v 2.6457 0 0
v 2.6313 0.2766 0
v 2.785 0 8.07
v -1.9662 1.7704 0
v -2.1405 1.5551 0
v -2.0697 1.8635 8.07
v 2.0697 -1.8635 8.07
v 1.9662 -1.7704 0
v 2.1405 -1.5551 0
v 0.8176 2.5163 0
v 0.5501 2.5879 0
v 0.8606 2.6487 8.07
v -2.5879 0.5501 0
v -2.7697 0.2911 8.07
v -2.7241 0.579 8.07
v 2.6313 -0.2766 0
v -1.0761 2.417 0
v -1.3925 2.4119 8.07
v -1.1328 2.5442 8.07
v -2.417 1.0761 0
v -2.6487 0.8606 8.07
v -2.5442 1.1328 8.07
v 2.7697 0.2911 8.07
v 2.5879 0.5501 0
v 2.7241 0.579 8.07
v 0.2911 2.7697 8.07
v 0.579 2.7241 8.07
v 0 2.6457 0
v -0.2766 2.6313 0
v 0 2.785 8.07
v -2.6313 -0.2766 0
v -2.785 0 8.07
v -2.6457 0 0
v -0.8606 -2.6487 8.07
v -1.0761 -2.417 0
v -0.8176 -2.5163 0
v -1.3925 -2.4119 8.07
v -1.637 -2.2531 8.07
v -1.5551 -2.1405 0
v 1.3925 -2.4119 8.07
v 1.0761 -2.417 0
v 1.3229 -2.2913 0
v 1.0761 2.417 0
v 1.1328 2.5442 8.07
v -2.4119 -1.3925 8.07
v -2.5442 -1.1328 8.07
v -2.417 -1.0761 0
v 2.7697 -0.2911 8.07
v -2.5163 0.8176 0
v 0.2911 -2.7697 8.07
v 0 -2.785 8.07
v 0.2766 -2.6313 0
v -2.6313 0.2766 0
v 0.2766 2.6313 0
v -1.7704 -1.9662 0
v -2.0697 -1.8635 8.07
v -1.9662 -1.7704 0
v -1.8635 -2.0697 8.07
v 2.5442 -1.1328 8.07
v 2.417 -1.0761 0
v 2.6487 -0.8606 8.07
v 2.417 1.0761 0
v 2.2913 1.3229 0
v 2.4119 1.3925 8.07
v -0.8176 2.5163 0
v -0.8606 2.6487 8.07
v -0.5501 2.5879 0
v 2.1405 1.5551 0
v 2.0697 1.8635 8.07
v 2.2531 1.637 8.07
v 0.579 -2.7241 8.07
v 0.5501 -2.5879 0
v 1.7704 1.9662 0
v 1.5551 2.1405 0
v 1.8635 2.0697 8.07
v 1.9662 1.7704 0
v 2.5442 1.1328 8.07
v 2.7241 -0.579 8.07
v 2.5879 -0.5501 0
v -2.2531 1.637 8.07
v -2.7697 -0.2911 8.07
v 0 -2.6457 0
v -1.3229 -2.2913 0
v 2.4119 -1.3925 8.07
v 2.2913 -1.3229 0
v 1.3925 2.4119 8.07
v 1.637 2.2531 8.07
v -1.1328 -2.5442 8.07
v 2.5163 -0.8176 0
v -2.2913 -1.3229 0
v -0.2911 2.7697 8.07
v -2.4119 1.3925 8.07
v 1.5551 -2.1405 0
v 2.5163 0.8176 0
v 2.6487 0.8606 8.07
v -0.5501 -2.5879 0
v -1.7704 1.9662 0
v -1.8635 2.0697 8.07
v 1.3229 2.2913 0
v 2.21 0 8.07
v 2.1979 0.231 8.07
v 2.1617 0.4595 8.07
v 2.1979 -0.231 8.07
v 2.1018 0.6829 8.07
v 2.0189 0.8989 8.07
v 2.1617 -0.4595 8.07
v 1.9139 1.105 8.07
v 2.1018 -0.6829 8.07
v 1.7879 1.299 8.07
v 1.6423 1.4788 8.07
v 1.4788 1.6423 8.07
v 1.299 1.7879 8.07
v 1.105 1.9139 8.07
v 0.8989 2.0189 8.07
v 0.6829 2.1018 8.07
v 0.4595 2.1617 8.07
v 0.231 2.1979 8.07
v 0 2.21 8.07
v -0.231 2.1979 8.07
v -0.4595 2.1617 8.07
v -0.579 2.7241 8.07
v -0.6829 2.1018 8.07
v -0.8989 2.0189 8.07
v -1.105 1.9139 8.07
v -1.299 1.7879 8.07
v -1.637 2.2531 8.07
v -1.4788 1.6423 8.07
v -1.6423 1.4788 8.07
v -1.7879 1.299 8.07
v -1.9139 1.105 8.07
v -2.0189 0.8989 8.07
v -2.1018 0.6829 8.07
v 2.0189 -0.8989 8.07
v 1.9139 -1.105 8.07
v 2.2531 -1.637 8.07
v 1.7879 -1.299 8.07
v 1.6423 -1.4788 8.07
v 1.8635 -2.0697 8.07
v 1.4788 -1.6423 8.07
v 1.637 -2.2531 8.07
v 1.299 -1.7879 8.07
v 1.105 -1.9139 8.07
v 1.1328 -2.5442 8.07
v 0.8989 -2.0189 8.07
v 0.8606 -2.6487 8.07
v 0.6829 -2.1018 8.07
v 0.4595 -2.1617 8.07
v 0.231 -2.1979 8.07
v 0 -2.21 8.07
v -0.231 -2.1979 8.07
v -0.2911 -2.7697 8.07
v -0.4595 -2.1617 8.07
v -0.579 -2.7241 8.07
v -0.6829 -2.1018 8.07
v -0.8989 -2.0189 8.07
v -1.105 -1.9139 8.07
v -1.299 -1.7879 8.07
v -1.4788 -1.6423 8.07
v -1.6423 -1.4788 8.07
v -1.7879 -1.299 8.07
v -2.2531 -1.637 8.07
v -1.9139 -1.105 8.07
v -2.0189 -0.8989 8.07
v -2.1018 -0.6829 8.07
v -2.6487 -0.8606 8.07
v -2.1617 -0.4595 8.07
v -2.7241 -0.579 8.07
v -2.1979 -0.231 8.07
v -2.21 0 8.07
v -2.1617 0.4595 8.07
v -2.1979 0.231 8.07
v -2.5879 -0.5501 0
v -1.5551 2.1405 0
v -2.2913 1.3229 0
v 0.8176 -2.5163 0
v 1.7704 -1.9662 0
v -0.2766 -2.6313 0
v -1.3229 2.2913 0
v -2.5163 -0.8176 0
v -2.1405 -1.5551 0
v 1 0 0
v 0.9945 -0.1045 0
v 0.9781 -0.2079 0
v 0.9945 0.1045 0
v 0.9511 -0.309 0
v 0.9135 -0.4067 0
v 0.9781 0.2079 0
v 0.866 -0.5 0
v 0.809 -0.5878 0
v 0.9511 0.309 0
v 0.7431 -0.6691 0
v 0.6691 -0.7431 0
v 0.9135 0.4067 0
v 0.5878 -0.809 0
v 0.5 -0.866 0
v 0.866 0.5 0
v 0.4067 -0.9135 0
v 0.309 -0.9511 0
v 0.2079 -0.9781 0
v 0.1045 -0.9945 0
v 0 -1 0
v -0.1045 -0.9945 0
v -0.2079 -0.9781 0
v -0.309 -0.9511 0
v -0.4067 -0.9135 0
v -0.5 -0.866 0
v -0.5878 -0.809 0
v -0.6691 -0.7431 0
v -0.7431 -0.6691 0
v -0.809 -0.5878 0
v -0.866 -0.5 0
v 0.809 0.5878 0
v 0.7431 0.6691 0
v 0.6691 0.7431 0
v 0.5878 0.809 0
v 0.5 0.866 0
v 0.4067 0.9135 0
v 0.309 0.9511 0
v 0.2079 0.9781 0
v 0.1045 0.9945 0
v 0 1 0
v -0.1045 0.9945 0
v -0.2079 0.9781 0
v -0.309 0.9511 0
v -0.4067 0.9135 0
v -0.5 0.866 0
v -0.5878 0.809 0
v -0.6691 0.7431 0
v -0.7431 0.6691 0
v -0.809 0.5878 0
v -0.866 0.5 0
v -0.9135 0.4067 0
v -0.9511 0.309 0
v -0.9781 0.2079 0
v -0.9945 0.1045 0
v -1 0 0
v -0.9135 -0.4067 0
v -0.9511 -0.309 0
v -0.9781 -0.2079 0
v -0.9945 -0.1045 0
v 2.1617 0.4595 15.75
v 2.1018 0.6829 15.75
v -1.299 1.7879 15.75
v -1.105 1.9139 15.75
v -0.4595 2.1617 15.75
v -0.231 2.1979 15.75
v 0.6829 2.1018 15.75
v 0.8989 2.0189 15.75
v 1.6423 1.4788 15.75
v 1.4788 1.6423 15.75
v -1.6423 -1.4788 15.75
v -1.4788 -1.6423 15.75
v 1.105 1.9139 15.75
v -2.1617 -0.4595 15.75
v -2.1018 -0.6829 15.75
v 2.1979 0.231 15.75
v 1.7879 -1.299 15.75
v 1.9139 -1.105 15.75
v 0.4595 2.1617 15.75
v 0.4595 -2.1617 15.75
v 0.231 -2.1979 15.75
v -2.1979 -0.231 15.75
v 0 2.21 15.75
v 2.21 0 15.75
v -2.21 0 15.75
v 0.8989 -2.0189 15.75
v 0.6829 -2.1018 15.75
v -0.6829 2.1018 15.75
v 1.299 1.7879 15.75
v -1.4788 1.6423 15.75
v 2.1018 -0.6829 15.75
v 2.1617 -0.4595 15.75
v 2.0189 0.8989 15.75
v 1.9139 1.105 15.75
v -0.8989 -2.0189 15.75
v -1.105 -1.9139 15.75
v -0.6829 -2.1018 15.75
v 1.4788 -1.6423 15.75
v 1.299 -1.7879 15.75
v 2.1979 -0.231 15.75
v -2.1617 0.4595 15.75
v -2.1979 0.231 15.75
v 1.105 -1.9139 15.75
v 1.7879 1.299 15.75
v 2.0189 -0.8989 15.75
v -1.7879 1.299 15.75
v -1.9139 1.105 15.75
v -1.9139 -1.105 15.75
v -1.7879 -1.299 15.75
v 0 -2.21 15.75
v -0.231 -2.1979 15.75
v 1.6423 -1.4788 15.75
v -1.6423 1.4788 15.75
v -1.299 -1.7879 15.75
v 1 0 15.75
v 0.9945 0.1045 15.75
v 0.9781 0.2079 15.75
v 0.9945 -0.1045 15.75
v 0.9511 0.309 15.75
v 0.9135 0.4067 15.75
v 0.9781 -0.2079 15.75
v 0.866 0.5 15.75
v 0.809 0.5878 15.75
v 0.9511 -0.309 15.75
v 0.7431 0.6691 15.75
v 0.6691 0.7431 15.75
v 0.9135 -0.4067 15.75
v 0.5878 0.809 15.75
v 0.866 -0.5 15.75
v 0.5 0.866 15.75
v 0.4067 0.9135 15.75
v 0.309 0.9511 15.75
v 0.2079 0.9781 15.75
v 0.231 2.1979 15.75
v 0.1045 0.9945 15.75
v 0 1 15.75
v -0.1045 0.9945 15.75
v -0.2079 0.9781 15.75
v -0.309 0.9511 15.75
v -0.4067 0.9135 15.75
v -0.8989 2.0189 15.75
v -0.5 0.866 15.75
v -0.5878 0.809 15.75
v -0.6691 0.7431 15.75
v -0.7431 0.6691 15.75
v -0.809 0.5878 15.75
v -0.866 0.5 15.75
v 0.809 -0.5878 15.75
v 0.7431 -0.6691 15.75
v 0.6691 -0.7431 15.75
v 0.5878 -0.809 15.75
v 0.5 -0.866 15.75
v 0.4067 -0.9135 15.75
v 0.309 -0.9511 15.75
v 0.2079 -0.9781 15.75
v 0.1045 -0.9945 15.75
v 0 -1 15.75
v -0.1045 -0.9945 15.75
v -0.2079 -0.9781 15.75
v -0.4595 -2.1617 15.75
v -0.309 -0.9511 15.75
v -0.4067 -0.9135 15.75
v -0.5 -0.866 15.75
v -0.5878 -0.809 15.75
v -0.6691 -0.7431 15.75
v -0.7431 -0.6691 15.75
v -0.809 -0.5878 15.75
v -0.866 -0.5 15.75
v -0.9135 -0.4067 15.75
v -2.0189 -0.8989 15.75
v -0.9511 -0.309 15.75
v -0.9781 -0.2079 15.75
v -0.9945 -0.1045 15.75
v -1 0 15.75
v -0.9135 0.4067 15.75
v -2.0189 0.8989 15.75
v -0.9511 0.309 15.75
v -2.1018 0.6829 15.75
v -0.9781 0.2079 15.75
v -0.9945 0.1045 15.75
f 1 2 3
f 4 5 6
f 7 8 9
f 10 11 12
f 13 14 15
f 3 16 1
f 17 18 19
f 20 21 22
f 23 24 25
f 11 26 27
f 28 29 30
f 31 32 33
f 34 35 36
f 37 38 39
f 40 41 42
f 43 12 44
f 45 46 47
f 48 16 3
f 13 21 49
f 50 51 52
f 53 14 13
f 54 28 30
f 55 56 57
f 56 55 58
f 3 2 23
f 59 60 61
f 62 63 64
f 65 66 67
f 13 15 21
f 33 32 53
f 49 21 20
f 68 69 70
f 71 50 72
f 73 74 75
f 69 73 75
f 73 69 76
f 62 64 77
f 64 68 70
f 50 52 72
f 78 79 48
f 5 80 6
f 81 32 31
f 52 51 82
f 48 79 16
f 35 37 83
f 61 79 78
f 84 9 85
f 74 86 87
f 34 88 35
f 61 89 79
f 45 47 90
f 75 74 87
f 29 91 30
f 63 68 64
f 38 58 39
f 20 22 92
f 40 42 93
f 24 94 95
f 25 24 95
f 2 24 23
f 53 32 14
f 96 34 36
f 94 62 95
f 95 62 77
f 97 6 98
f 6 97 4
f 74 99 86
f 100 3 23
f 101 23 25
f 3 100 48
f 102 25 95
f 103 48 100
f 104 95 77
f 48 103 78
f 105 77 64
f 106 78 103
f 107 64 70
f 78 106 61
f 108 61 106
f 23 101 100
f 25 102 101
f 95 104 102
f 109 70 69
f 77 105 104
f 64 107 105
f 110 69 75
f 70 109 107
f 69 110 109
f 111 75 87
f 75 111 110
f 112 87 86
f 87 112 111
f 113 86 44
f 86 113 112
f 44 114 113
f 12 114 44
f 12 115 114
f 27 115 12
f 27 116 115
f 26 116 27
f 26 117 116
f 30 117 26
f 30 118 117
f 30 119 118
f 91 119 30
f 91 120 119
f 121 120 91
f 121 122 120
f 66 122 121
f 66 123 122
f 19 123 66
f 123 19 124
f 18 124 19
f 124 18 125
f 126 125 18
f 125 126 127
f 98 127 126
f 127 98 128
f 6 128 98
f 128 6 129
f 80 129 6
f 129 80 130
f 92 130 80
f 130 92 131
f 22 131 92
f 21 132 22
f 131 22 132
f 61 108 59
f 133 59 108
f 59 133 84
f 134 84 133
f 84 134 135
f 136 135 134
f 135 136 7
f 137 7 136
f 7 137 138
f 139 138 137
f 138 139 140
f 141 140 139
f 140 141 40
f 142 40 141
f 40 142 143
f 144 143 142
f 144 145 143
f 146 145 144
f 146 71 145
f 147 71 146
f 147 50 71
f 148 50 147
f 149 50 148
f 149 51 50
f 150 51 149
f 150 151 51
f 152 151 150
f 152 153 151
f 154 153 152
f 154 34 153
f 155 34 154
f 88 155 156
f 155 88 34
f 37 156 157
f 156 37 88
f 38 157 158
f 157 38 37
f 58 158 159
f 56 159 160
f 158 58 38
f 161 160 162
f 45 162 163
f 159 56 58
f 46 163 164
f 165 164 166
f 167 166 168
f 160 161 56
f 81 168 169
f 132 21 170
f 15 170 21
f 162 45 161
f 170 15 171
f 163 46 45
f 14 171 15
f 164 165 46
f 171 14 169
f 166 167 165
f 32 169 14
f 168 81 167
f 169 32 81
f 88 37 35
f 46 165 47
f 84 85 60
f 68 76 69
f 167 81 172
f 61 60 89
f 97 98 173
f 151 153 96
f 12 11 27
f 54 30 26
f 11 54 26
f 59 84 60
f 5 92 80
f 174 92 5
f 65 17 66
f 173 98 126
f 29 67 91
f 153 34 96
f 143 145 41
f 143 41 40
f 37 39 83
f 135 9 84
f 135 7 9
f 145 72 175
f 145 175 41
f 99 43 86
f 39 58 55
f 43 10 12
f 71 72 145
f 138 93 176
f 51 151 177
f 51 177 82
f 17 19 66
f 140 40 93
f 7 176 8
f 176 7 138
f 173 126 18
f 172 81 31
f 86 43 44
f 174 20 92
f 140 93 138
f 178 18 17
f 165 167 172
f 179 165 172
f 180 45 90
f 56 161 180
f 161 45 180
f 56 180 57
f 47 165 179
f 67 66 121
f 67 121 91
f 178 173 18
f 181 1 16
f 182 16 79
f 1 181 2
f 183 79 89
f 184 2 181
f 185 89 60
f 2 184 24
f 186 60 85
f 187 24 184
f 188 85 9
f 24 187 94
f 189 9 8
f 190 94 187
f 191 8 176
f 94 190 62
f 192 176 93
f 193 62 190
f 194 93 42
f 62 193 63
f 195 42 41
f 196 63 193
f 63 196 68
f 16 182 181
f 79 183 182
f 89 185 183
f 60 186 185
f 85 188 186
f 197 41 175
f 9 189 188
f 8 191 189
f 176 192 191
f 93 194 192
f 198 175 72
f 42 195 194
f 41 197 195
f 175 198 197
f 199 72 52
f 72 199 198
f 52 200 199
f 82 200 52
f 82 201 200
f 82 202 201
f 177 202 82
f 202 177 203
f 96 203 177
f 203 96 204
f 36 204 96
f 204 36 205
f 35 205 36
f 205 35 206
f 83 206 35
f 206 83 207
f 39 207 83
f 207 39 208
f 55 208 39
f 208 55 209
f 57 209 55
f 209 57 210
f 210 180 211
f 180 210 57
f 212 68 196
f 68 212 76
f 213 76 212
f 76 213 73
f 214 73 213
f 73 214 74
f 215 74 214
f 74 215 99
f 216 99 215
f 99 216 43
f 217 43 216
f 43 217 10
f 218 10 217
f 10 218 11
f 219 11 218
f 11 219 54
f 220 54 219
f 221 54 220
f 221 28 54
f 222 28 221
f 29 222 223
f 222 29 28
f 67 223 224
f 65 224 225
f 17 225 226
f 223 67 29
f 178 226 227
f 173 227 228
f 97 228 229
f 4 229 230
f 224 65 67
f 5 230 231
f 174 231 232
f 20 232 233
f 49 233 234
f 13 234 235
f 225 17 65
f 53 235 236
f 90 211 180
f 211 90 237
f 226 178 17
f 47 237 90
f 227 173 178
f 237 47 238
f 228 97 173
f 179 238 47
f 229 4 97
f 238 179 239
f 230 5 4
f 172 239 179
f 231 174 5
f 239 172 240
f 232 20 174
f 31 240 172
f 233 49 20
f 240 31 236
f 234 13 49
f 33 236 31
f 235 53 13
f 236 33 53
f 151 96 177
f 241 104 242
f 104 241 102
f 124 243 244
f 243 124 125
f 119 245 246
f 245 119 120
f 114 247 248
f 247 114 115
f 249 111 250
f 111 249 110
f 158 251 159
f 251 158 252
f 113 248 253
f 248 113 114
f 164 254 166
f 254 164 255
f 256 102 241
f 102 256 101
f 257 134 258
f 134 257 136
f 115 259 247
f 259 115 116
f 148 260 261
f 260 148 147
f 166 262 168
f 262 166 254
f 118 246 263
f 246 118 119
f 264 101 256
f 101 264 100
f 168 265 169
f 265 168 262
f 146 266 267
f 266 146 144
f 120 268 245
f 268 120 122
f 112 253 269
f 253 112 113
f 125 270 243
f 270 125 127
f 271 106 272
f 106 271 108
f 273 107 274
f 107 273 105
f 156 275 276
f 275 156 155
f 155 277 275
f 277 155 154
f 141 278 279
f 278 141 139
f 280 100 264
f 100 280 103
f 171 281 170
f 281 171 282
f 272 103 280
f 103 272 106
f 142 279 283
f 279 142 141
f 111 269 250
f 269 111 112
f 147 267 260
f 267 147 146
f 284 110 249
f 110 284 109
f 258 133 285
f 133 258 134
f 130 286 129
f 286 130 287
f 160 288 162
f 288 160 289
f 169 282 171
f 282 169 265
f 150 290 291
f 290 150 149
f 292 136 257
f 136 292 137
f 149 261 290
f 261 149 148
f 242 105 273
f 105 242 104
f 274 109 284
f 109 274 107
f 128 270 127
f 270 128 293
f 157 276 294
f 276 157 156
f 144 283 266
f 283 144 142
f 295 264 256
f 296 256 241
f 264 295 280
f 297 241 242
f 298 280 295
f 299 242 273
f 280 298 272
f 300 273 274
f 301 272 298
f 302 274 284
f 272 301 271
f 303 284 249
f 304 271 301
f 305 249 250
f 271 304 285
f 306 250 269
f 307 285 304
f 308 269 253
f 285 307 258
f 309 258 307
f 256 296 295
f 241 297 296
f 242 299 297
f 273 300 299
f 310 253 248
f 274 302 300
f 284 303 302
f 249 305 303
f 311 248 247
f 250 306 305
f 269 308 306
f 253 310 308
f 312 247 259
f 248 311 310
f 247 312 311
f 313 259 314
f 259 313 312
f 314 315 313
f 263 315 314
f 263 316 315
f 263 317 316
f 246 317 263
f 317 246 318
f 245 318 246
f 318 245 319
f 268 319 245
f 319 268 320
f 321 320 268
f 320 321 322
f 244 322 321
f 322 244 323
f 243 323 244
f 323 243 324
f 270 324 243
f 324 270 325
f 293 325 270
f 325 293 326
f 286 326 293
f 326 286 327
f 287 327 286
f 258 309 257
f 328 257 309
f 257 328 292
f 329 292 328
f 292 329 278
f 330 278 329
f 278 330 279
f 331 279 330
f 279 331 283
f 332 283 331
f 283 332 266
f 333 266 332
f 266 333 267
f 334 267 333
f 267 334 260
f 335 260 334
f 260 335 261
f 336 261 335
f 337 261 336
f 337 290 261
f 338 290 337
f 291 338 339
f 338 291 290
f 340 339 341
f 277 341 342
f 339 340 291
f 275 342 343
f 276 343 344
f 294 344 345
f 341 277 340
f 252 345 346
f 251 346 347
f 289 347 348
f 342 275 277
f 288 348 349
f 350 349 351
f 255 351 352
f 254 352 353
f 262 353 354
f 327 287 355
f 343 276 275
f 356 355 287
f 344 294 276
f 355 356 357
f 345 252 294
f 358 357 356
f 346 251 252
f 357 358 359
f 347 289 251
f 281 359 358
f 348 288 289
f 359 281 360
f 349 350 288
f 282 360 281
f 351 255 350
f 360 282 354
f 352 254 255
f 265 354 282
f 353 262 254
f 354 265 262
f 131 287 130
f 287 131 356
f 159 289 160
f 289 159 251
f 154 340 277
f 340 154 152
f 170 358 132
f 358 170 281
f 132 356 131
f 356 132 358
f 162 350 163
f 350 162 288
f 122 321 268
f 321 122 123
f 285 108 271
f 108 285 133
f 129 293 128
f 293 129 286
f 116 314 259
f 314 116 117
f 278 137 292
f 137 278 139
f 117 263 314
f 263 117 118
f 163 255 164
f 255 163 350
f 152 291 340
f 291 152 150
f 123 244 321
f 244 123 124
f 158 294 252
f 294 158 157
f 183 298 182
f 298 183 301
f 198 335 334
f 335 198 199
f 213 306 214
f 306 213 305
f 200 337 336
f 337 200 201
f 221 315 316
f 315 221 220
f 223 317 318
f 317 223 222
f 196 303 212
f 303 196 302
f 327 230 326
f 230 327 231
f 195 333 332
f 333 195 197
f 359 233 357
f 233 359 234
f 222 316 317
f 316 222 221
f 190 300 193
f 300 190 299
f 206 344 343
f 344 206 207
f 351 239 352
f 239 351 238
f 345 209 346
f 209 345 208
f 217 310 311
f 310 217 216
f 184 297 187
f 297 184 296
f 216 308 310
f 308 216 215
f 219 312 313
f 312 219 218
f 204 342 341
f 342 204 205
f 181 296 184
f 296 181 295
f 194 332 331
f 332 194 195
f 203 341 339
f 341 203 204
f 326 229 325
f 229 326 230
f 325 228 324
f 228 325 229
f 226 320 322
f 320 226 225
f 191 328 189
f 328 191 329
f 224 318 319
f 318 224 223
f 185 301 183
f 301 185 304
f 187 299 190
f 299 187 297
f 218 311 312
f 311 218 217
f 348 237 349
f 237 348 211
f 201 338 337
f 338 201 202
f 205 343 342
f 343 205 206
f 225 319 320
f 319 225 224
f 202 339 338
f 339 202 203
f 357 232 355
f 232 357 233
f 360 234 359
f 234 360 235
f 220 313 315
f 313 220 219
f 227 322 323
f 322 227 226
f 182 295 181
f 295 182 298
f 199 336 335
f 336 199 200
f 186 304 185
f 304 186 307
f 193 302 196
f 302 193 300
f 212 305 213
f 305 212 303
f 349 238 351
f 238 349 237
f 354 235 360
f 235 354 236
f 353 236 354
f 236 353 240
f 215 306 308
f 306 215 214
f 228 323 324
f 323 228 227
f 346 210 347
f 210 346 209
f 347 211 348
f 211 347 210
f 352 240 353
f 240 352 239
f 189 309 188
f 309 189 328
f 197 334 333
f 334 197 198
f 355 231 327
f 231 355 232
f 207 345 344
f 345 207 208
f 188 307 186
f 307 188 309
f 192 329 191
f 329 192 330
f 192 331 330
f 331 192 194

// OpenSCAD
//Author: Paul J White
//Date: 4/23/22
//Purpose: Have and editible pen ink adapter
//Note: All Mesaurements are in Millimeters

//How far you want it to go into the pen
iHeight = 7.68;
//How far you want to make the top of the head
pHeight = 8.07;
//Inner diam of you ink cartridge 
iDiam   = 4.42;
//Diam for the stopper on the pen
pDiam   = 5.57;
//Diam for the hole in the middle
sDiam = 1;
//How good of a cylander do you want (Higher is more circular)
res = 60;
//How much to taper the pen insert (lower is more)
taper = .95;


//-----Maths------
iRad = iDiam /2;
pRad = pDiam /2;


difference(){
    union()
    {
        //Insert into Pen
        cylinder($fn =res, h=pHeight, r1=pRad*taper, r2=pRad);
       

        //top
        translate([0,0,pHeight])
        {
            //insert into ink
            cylinder($fn =res, h=iHeight, r=iRad);
        }
    }
    //Safety hole
    cylinder($fn = res, h=iHeight+pHeight+1, r=sDiam);
}
